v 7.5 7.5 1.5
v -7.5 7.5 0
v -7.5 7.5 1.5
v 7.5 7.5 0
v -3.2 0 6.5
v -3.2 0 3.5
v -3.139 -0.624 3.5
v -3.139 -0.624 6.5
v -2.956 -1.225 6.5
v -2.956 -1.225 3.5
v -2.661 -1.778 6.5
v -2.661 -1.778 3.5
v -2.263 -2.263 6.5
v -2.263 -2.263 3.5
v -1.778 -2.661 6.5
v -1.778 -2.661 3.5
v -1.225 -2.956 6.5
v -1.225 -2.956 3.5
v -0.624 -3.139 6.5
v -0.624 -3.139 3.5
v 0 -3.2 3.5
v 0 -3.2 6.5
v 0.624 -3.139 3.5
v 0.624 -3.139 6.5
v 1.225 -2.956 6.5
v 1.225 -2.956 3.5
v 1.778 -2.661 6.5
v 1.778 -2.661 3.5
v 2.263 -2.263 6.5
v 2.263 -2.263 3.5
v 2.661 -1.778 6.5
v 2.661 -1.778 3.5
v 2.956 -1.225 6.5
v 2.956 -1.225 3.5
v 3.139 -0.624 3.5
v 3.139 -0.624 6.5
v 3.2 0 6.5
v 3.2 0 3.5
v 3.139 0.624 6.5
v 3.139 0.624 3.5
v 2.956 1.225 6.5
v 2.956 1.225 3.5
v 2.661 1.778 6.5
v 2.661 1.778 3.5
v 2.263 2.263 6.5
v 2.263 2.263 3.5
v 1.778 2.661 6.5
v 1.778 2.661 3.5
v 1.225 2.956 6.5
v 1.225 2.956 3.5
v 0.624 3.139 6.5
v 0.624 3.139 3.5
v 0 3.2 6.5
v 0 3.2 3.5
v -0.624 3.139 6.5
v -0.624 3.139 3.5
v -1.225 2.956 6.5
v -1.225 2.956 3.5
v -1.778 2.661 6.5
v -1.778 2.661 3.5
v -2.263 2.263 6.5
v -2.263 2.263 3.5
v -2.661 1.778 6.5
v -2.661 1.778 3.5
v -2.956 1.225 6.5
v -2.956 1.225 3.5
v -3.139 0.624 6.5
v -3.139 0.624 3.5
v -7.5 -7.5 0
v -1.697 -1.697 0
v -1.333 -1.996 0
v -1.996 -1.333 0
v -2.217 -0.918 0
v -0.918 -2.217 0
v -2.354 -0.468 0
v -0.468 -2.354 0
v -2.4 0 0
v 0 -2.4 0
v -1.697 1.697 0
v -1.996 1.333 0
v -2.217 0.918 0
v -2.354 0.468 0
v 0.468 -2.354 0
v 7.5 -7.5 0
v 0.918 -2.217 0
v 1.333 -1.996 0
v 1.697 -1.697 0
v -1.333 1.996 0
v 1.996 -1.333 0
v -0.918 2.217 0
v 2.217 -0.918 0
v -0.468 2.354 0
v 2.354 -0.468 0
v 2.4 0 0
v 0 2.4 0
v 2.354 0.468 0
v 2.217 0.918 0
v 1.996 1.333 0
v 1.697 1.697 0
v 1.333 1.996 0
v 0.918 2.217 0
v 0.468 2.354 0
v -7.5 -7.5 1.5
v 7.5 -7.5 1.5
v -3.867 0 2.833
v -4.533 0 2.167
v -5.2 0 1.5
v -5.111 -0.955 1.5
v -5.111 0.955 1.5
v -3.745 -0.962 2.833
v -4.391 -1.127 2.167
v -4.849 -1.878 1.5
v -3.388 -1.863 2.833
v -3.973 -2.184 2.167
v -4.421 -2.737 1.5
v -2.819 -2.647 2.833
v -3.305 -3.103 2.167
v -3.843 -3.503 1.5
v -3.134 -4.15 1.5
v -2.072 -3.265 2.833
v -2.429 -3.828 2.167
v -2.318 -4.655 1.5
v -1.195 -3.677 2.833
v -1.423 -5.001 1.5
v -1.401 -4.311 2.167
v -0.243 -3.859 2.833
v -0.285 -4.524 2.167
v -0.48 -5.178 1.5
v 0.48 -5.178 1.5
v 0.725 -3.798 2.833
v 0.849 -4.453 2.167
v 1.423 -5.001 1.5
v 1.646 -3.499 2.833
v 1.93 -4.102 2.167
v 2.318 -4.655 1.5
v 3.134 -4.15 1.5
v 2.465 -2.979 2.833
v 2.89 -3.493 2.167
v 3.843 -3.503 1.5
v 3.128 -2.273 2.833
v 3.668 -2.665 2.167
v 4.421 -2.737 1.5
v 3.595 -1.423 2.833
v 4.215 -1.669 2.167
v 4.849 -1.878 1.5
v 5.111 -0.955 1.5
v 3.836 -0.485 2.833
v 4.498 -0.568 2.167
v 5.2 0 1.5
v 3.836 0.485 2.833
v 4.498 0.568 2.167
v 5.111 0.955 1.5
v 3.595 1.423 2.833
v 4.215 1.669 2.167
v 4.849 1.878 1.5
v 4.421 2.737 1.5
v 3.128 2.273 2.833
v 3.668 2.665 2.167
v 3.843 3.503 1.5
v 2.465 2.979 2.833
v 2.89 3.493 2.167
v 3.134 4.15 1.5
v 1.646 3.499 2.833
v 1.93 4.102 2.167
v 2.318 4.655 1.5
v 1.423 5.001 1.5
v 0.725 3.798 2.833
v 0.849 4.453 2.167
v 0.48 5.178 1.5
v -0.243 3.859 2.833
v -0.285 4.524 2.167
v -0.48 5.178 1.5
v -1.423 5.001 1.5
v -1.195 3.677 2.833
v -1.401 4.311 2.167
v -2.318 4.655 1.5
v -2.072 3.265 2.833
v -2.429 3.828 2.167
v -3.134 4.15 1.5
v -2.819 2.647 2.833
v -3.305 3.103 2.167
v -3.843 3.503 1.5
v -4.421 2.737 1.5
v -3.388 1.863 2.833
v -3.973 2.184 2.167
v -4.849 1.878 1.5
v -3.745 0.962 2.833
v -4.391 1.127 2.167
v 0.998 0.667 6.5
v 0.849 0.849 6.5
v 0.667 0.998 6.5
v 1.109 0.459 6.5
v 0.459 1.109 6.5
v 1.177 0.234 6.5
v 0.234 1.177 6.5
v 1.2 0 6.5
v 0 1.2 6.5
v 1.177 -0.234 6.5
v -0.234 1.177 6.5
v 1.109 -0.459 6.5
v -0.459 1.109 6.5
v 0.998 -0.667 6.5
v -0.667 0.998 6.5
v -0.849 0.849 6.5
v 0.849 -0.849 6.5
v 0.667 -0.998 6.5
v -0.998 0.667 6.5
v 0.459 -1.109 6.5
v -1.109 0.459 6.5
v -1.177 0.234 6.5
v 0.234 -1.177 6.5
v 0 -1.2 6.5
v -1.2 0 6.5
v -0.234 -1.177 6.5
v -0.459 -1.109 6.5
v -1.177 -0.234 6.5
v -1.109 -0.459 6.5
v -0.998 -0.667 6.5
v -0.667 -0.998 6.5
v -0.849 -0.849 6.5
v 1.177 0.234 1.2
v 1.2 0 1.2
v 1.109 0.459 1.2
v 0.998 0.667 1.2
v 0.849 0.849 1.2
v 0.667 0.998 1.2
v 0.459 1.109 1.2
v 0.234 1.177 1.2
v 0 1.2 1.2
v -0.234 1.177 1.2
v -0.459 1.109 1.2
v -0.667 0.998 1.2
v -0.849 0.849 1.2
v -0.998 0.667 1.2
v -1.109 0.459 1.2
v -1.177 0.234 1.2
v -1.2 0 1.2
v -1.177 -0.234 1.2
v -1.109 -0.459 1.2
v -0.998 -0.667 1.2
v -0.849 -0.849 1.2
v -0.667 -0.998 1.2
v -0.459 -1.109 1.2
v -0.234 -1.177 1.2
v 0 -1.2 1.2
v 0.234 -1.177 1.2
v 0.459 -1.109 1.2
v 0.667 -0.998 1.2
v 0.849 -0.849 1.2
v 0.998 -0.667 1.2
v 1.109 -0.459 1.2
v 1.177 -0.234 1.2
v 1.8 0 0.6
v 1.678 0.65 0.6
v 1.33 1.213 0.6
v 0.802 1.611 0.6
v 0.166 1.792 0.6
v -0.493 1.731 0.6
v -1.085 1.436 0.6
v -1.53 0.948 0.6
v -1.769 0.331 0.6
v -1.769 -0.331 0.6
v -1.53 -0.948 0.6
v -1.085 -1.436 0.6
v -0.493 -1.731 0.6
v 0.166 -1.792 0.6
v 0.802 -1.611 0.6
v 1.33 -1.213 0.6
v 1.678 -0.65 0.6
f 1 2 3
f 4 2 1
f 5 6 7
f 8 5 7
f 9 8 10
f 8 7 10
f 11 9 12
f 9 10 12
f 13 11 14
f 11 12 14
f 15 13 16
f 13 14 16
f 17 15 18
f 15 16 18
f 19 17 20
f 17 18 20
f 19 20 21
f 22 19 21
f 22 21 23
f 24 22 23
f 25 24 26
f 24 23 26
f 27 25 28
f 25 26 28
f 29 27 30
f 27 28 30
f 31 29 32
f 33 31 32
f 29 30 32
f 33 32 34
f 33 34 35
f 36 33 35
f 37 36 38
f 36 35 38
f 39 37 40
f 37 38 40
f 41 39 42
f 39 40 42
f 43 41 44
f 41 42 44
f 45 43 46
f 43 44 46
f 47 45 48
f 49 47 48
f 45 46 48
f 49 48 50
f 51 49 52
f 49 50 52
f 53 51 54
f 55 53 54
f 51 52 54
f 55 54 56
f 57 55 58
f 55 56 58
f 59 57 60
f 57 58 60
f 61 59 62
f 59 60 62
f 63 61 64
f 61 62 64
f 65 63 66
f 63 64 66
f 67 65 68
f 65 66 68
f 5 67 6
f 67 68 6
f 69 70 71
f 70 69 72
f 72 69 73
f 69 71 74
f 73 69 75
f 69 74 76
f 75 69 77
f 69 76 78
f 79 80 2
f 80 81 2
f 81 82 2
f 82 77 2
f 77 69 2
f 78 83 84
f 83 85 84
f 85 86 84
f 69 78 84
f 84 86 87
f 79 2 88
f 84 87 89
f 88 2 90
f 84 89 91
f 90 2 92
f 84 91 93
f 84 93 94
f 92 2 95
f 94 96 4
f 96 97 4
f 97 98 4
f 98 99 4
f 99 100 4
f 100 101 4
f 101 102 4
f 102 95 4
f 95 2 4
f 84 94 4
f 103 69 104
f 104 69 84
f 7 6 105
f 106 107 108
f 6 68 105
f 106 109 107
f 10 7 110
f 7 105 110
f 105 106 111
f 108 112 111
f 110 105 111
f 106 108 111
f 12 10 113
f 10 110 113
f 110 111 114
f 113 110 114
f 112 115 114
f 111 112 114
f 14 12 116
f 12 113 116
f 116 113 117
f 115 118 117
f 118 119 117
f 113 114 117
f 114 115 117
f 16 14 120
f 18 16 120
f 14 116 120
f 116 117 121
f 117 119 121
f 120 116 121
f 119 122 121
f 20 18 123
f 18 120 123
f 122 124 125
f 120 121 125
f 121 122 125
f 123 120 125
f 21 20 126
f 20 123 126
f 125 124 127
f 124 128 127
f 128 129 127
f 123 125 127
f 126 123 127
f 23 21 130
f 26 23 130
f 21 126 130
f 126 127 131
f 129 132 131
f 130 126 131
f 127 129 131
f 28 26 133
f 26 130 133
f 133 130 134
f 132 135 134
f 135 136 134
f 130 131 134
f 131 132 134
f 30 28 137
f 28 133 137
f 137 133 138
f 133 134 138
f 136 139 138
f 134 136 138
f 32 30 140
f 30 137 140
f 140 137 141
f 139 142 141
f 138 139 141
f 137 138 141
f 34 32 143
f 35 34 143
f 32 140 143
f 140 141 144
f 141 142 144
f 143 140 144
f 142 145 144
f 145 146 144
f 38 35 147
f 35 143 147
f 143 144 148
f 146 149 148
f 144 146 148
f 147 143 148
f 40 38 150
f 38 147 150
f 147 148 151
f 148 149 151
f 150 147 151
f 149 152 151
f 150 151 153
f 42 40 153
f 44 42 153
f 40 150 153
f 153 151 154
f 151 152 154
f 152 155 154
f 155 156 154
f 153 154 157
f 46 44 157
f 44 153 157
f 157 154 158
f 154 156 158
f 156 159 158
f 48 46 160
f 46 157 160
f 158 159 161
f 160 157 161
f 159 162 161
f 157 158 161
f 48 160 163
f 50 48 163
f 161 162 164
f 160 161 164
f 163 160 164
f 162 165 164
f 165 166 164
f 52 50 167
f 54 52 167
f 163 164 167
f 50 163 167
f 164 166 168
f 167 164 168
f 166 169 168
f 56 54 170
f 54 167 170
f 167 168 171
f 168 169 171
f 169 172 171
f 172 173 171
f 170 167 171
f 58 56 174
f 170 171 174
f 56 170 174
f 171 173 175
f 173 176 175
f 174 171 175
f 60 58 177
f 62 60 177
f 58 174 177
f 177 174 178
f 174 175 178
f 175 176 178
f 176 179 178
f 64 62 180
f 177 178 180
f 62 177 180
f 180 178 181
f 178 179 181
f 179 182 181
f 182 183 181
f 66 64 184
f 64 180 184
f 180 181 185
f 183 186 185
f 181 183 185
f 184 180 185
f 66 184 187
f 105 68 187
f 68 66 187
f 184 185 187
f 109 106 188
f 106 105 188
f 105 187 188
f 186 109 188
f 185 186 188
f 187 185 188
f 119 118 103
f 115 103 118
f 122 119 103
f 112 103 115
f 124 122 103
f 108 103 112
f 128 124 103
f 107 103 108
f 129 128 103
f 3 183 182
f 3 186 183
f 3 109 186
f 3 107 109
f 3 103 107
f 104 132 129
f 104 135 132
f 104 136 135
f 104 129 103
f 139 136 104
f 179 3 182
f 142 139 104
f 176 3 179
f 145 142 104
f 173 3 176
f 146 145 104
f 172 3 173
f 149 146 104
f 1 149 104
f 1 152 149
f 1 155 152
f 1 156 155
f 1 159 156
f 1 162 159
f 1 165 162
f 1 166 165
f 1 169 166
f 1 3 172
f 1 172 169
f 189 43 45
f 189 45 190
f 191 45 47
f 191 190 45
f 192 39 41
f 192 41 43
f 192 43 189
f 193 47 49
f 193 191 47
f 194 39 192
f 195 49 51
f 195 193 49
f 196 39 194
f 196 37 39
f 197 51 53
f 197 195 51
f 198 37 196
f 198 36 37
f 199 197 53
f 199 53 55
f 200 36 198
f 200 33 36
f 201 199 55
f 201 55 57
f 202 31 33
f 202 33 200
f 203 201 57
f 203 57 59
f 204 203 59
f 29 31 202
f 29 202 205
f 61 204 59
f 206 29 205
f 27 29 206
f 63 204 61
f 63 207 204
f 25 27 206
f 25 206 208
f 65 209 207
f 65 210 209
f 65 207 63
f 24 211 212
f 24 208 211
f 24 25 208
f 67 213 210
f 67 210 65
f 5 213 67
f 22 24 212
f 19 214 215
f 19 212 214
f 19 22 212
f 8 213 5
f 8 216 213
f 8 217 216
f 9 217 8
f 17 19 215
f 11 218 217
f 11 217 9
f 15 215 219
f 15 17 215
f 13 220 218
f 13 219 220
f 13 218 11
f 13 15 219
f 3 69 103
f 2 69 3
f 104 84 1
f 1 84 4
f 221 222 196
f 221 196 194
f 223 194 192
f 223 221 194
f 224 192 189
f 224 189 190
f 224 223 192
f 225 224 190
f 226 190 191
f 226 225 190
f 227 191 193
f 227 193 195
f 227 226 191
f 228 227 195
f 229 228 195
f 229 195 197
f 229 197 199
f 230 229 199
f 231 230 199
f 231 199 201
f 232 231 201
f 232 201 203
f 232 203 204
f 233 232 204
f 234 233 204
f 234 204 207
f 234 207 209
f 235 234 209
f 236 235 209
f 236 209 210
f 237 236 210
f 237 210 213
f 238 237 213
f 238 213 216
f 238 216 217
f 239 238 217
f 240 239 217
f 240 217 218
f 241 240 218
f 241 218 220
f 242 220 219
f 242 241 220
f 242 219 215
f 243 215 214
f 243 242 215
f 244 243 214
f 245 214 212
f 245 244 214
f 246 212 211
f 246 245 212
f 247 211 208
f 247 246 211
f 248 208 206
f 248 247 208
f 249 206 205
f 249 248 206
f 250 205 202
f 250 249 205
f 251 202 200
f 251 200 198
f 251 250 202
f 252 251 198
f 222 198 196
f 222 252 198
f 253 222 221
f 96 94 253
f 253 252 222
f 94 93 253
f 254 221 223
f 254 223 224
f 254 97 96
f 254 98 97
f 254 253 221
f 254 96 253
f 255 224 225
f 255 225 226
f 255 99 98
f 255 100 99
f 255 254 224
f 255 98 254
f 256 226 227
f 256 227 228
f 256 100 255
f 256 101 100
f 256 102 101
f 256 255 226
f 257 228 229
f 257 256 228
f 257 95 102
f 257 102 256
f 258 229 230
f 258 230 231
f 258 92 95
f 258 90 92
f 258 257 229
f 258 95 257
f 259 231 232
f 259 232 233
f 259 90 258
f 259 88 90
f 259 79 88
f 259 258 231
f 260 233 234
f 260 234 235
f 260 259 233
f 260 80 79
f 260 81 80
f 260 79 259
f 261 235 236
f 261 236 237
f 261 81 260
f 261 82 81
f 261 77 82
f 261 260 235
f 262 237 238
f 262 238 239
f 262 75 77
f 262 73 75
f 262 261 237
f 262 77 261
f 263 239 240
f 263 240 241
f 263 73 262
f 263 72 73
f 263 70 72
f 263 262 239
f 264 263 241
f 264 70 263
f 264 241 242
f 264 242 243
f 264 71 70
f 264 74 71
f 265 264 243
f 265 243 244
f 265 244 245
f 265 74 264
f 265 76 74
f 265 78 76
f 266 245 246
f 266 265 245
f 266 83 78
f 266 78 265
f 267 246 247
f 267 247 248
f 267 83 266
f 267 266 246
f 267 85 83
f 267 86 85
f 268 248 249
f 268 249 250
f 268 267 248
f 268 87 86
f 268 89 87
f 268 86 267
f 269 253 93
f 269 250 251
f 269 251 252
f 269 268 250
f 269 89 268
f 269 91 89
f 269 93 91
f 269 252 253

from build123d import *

# Parameters (mm, degrees)
SKETCH_2_W        = 15
SKETCH_2_H        = 15
SKETCH_2_R        = 1.2
EXTRUDE_430_DEPTH = 1.5
SKETCH_3_R        = 3.2
SKETCH_3_R_2      = 1.2
EXTRUDE_671_DEPTH = 5
CHAMFER_1_SIZE    = 1.2
CHAMFER_2_SIZE    = 2


with BuildPart() as part:
    # Эскиз2 → Extrude 430 (new body)
    with BuildSketch(Plane.XY):
        Rectangle(SKETCH_2_W, SKETCH_2_H)
        Circle(SKETCH_2_R, mode=Mode.SUBTRACT)
    extrude(amount=EXTRUDE_430_DEPTH)

    # Эскиз3 → Extrude 671 (add)
    with BuildSketch(Plane.XY.offset(1.5)):
        with Locations(Location((0, 0, 0), (0, 0, 180))):
            Circle(SKETCH_3_R)
        Circle(SKETCH_3_R_2, mode=Mode.SUBTRACT)
    extrude(amount=EXTRUDE_671_DEPTH)

    # Фаска1
    chamfer_1_edges = [part.edges().sort_by_distance(p)[0] for p in [
        (-1.2, 0, 0),
    ]]
    chamfer(chamfer_1_edges, length=CHAMFER_1_SIZE)

    # Фаска2
    chamfer_2_edges = [part.edges().sort_by_distance(p)[0] for p in [
        (3.2, 0, 1.5),
    ]]
    chamfer(chamfer_2_edges, length=CHAMFER_2_SIZE)


solid = part.part
